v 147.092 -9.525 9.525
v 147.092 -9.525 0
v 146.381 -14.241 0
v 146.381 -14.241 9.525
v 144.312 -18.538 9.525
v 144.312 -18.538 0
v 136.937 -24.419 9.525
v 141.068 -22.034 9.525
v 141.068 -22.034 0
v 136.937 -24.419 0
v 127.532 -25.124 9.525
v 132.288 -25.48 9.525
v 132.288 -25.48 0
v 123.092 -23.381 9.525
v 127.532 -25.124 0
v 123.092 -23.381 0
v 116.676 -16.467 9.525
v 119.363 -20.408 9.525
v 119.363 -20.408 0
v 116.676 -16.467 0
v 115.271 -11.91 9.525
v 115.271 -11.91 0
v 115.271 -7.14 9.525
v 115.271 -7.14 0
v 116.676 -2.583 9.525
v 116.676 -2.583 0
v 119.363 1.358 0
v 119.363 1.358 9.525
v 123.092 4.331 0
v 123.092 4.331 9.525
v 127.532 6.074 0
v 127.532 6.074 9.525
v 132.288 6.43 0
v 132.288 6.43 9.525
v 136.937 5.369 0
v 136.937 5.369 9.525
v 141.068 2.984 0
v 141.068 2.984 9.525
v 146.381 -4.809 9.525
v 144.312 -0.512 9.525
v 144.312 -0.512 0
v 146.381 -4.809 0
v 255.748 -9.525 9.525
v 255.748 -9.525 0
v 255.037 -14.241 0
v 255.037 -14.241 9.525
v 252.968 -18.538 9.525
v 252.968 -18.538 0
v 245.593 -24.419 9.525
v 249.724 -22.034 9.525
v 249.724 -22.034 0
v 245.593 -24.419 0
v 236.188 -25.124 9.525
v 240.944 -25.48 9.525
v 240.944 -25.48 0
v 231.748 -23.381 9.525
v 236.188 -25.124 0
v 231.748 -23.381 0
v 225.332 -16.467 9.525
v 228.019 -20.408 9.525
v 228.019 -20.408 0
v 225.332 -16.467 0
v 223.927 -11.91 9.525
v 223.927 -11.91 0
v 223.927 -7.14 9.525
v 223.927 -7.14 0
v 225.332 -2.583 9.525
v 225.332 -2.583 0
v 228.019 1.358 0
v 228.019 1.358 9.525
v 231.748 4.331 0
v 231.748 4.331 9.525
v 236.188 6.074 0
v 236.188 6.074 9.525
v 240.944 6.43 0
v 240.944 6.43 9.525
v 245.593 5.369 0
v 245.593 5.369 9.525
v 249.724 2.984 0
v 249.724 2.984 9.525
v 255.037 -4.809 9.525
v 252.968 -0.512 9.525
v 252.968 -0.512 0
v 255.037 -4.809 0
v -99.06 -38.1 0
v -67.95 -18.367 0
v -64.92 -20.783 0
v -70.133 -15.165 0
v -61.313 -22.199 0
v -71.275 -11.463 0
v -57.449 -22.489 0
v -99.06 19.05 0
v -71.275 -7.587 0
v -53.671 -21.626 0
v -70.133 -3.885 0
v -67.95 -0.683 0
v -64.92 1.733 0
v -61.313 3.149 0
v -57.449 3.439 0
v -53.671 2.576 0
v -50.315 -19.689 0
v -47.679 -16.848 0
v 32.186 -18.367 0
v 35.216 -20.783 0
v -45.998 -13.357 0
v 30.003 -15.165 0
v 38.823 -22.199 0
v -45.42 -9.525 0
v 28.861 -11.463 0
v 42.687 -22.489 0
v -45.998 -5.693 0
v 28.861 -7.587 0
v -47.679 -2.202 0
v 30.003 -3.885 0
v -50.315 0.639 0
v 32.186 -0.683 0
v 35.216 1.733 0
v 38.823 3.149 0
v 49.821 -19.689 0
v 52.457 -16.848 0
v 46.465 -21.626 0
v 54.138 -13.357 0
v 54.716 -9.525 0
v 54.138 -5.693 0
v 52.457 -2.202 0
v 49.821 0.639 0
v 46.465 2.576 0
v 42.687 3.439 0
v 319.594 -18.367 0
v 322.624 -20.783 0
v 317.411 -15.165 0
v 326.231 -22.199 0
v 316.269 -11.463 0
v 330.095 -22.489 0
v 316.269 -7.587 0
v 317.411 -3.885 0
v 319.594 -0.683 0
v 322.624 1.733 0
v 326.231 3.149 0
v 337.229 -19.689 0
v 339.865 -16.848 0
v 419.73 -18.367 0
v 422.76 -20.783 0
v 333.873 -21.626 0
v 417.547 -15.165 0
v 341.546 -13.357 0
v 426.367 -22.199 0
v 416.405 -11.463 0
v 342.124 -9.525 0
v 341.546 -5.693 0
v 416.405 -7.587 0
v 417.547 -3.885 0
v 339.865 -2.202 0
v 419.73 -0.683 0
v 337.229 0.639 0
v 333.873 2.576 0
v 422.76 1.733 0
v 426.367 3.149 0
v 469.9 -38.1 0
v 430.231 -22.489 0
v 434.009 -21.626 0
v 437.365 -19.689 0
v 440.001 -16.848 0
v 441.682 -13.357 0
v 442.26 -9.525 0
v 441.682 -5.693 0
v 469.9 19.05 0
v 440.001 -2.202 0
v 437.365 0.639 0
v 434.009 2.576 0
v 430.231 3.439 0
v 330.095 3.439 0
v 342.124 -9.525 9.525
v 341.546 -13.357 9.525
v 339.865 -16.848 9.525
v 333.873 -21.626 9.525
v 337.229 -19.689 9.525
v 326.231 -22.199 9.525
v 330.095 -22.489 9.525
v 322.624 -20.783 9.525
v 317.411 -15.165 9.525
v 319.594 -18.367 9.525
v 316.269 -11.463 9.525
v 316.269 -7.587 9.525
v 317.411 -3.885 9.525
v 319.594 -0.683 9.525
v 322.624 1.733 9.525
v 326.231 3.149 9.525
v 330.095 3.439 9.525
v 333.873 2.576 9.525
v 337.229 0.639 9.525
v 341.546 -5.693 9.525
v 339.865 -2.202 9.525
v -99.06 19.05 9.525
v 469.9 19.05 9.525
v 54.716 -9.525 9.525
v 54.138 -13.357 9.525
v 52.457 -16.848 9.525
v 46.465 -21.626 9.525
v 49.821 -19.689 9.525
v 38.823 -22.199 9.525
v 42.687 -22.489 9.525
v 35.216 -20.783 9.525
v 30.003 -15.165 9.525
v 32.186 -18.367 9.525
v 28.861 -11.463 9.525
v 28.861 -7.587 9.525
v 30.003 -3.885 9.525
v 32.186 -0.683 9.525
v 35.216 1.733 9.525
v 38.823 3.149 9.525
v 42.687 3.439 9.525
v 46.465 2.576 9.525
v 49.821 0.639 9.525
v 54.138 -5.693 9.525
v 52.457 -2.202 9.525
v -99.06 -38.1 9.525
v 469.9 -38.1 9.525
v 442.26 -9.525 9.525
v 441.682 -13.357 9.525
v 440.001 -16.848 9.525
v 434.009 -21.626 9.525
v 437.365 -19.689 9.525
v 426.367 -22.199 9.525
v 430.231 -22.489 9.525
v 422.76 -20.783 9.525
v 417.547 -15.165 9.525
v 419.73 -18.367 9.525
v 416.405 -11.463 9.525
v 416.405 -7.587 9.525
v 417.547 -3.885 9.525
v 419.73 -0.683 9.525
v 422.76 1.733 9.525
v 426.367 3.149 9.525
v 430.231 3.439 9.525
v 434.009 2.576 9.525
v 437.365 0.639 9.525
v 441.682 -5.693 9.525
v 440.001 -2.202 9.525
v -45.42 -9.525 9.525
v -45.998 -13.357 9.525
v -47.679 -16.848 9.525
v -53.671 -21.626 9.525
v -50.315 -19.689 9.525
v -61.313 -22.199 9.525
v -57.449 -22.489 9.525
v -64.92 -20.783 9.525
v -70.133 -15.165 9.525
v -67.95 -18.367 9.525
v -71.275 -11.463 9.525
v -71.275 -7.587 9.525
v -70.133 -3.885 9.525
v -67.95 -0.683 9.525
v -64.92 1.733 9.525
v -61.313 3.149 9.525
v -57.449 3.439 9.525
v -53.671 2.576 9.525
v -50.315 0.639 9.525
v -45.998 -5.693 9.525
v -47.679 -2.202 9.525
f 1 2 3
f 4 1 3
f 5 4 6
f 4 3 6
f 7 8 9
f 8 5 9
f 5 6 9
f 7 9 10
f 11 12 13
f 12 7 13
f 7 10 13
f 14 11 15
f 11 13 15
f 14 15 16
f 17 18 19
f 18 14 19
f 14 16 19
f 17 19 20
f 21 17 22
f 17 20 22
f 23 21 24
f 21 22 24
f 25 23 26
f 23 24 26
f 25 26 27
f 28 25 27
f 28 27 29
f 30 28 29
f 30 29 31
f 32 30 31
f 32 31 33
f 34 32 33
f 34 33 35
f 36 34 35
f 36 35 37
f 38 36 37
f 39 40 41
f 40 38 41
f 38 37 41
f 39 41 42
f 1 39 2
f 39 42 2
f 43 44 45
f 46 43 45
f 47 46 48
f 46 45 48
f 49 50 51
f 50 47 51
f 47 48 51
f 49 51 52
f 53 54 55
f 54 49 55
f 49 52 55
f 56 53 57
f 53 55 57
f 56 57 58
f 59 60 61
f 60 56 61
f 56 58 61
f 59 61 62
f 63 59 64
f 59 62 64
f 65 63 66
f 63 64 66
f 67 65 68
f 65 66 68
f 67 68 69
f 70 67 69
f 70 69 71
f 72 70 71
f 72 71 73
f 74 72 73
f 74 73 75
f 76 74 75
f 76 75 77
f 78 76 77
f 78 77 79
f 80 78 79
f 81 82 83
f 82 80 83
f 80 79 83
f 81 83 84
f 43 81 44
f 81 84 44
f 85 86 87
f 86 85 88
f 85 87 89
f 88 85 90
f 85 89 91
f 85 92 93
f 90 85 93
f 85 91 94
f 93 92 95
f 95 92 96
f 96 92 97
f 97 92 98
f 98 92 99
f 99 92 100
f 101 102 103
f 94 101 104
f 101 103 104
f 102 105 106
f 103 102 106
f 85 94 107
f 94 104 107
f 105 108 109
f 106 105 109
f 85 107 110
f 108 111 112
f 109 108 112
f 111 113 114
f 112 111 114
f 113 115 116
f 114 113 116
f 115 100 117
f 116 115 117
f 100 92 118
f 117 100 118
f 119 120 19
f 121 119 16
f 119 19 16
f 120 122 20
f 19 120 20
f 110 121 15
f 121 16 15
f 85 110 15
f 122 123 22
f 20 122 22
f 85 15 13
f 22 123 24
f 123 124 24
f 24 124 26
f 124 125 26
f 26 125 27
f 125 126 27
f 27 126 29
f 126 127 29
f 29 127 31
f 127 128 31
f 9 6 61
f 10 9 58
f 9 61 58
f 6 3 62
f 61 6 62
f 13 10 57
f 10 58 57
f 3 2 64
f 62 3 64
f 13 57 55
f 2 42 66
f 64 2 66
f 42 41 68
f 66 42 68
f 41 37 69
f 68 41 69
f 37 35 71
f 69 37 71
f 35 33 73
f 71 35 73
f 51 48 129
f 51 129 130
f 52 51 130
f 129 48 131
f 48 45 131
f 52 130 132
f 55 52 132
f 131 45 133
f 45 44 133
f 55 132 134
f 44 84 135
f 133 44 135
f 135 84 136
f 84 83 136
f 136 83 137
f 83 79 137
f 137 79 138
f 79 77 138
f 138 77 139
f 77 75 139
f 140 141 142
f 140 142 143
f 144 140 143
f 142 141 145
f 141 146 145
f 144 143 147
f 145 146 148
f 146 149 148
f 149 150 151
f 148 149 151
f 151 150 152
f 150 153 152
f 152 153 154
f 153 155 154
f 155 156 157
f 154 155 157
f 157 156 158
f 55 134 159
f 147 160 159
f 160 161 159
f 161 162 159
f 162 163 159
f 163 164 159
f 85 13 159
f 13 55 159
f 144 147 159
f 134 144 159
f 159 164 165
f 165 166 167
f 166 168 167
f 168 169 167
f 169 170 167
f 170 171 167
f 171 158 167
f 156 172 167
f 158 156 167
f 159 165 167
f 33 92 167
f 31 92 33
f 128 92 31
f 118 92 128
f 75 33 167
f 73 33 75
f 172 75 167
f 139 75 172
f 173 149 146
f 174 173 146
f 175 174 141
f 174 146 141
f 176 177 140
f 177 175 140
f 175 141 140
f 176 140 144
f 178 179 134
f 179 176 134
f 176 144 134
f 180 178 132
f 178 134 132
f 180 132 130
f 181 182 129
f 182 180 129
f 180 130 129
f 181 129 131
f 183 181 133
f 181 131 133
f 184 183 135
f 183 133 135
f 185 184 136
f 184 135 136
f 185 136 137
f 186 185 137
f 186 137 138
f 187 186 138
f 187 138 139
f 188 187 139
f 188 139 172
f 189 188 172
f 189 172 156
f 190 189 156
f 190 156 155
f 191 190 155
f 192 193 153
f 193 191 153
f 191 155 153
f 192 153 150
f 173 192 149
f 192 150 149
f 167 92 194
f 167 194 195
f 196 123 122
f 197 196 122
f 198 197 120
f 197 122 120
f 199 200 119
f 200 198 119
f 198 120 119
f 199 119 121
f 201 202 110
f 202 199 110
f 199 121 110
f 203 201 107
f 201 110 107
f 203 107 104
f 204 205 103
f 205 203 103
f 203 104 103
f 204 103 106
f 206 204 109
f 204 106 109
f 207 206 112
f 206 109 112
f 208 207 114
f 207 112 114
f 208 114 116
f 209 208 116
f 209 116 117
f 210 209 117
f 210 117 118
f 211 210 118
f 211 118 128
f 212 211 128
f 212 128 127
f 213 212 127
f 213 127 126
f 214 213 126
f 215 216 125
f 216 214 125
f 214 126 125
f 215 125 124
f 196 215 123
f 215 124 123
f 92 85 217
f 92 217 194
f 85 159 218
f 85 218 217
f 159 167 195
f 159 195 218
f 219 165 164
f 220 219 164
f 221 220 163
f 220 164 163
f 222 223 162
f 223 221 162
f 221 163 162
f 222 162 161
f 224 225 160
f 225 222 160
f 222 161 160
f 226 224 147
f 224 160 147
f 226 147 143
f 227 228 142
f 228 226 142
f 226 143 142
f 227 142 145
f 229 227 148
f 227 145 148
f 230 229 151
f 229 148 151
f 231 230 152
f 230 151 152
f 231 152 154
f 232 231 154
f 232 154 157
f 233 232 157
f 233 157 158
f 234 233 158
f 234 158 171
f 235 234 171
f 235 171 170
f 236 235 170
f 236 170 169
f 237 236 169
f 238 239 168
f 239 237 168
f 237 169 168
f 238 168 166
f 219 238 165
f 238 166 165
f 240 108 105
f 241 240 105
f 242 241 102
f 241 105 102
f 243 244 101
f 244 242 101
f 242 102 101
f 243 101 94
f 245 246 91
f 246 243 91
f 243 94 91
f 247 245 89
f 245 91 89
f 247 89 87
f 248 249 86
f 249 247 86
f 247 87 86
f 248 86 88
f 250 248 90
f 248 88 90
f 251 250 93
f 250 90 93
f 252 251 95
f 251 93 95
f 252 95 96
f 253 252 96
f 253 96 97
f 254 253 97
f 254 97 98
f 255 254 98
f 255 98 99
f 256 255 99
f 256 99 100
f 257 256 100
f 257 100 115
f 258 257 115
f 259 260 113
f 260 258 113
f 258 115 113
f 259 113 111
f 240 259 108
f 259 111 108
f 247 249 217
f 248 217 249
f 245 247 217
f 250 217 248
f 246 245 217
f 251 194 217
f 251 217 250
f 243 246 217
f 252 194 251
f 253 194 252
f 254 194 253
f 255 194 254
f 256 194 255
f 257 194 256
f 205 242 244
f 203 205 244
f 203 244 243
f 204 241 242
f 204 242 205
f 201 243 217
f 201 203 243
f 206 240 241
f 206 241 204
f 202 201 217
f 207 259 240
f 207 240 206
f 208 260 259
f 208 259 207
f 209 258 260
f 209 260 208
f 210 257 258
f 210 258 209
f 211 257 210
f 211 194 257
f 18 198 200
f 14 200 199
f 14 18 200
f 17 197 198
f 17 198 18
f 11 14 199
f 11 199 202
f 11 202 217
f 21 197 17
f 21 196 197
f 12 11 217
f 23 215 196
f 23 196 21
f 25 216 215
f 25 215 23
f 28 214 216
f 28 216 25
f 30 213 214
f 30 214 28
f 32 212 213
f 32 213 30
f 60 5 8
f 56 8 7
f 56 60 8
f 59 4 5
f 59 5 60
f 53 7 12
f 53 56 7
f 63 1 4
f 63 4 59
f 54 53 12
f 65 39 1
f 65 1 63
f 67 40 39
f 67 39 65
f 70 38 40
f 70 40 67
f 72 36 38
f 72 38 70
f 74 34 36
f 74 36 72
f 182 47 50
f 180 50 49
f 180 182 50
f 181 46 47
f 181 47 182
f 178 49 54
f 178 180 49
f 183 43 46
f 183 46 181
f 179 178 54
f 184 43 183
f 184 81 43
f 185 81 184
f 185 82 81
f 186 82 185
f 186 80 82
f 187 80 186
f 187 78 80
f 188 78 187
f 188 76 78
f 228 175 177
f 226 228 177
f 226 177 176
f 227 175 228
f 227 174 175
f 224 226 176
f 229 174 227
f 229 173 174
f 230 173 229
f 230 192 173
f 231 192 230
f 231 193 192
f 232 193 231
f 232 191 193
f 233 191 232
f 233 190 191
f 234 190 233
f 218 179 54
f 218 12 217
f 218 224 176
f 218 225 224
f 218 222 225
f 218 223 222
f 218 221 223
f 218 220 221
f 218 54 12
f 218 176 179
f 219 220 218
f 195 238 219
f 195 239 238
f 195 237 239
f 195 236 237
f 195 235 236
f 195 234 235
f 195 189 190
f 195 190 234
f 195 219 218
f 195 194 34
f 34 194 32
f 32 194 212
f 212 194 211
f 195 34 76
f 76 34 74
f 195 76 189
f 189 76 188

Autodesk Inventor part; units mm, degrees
ref_plane "YZ Plane" through (0, 0, 0) normal (1, 0, 0) x (0, 1, 0)
ref_plane "XZ Plane" through (0, 0, 0) normal (0, 1, 0) x (-1, 0, 0)
ref_plane "XY Plane" through (0, 0, 0) normal (0, 0, 1) x (1, 0, 0)
sketch "Sketch1" plane through (0, 0, 0) normal (0, 0, 1) x (1, 0, 0)
  line L0 (-99.06, 19.05) -> (469.9, 19.05)
  line L1 (469.9, 19.05) -> (469.9, -38.1)
  line L2 (469.9, -38.1) -> (-99.06, -38.1)
  line L3 (-99.06, -38.1) -> (-99.06, 19.05)
  circle A0 centre (-58.42, -9.525) radius 13
  circle A1 centre (41.716, -9.525) radius 13
  circle A2 centre (131.092, -9.525) radius 16
  circle A3 centre (429.26, -9.525) radius 13
  circle A4 centre (329.124, -9.525) radius 13
  circle A5 centre (239.748, -9.525) radius 16
  point P0 (0, 0)
  dimension "d4" = 26
  dimension "d6" = 26
  dimension "d8" = 32
  dimension "d10" = 26
  dimension "d12" = 26
  dimension "d14" = 32
  dimension "d16" = 568.96
  dimension "d17" = 57.15
  dimension "d18" = 40.64
  dimension "d19" = 140.776
  dimension "d20" = 230.152
  dimension "d21" = 230.152
  dimension "d22" = 40.64
  dimension "d23" = 140.776
extrude "Extrusion1" add sketch "Sketch1" along normal blind 9.525
properties part number "side"
